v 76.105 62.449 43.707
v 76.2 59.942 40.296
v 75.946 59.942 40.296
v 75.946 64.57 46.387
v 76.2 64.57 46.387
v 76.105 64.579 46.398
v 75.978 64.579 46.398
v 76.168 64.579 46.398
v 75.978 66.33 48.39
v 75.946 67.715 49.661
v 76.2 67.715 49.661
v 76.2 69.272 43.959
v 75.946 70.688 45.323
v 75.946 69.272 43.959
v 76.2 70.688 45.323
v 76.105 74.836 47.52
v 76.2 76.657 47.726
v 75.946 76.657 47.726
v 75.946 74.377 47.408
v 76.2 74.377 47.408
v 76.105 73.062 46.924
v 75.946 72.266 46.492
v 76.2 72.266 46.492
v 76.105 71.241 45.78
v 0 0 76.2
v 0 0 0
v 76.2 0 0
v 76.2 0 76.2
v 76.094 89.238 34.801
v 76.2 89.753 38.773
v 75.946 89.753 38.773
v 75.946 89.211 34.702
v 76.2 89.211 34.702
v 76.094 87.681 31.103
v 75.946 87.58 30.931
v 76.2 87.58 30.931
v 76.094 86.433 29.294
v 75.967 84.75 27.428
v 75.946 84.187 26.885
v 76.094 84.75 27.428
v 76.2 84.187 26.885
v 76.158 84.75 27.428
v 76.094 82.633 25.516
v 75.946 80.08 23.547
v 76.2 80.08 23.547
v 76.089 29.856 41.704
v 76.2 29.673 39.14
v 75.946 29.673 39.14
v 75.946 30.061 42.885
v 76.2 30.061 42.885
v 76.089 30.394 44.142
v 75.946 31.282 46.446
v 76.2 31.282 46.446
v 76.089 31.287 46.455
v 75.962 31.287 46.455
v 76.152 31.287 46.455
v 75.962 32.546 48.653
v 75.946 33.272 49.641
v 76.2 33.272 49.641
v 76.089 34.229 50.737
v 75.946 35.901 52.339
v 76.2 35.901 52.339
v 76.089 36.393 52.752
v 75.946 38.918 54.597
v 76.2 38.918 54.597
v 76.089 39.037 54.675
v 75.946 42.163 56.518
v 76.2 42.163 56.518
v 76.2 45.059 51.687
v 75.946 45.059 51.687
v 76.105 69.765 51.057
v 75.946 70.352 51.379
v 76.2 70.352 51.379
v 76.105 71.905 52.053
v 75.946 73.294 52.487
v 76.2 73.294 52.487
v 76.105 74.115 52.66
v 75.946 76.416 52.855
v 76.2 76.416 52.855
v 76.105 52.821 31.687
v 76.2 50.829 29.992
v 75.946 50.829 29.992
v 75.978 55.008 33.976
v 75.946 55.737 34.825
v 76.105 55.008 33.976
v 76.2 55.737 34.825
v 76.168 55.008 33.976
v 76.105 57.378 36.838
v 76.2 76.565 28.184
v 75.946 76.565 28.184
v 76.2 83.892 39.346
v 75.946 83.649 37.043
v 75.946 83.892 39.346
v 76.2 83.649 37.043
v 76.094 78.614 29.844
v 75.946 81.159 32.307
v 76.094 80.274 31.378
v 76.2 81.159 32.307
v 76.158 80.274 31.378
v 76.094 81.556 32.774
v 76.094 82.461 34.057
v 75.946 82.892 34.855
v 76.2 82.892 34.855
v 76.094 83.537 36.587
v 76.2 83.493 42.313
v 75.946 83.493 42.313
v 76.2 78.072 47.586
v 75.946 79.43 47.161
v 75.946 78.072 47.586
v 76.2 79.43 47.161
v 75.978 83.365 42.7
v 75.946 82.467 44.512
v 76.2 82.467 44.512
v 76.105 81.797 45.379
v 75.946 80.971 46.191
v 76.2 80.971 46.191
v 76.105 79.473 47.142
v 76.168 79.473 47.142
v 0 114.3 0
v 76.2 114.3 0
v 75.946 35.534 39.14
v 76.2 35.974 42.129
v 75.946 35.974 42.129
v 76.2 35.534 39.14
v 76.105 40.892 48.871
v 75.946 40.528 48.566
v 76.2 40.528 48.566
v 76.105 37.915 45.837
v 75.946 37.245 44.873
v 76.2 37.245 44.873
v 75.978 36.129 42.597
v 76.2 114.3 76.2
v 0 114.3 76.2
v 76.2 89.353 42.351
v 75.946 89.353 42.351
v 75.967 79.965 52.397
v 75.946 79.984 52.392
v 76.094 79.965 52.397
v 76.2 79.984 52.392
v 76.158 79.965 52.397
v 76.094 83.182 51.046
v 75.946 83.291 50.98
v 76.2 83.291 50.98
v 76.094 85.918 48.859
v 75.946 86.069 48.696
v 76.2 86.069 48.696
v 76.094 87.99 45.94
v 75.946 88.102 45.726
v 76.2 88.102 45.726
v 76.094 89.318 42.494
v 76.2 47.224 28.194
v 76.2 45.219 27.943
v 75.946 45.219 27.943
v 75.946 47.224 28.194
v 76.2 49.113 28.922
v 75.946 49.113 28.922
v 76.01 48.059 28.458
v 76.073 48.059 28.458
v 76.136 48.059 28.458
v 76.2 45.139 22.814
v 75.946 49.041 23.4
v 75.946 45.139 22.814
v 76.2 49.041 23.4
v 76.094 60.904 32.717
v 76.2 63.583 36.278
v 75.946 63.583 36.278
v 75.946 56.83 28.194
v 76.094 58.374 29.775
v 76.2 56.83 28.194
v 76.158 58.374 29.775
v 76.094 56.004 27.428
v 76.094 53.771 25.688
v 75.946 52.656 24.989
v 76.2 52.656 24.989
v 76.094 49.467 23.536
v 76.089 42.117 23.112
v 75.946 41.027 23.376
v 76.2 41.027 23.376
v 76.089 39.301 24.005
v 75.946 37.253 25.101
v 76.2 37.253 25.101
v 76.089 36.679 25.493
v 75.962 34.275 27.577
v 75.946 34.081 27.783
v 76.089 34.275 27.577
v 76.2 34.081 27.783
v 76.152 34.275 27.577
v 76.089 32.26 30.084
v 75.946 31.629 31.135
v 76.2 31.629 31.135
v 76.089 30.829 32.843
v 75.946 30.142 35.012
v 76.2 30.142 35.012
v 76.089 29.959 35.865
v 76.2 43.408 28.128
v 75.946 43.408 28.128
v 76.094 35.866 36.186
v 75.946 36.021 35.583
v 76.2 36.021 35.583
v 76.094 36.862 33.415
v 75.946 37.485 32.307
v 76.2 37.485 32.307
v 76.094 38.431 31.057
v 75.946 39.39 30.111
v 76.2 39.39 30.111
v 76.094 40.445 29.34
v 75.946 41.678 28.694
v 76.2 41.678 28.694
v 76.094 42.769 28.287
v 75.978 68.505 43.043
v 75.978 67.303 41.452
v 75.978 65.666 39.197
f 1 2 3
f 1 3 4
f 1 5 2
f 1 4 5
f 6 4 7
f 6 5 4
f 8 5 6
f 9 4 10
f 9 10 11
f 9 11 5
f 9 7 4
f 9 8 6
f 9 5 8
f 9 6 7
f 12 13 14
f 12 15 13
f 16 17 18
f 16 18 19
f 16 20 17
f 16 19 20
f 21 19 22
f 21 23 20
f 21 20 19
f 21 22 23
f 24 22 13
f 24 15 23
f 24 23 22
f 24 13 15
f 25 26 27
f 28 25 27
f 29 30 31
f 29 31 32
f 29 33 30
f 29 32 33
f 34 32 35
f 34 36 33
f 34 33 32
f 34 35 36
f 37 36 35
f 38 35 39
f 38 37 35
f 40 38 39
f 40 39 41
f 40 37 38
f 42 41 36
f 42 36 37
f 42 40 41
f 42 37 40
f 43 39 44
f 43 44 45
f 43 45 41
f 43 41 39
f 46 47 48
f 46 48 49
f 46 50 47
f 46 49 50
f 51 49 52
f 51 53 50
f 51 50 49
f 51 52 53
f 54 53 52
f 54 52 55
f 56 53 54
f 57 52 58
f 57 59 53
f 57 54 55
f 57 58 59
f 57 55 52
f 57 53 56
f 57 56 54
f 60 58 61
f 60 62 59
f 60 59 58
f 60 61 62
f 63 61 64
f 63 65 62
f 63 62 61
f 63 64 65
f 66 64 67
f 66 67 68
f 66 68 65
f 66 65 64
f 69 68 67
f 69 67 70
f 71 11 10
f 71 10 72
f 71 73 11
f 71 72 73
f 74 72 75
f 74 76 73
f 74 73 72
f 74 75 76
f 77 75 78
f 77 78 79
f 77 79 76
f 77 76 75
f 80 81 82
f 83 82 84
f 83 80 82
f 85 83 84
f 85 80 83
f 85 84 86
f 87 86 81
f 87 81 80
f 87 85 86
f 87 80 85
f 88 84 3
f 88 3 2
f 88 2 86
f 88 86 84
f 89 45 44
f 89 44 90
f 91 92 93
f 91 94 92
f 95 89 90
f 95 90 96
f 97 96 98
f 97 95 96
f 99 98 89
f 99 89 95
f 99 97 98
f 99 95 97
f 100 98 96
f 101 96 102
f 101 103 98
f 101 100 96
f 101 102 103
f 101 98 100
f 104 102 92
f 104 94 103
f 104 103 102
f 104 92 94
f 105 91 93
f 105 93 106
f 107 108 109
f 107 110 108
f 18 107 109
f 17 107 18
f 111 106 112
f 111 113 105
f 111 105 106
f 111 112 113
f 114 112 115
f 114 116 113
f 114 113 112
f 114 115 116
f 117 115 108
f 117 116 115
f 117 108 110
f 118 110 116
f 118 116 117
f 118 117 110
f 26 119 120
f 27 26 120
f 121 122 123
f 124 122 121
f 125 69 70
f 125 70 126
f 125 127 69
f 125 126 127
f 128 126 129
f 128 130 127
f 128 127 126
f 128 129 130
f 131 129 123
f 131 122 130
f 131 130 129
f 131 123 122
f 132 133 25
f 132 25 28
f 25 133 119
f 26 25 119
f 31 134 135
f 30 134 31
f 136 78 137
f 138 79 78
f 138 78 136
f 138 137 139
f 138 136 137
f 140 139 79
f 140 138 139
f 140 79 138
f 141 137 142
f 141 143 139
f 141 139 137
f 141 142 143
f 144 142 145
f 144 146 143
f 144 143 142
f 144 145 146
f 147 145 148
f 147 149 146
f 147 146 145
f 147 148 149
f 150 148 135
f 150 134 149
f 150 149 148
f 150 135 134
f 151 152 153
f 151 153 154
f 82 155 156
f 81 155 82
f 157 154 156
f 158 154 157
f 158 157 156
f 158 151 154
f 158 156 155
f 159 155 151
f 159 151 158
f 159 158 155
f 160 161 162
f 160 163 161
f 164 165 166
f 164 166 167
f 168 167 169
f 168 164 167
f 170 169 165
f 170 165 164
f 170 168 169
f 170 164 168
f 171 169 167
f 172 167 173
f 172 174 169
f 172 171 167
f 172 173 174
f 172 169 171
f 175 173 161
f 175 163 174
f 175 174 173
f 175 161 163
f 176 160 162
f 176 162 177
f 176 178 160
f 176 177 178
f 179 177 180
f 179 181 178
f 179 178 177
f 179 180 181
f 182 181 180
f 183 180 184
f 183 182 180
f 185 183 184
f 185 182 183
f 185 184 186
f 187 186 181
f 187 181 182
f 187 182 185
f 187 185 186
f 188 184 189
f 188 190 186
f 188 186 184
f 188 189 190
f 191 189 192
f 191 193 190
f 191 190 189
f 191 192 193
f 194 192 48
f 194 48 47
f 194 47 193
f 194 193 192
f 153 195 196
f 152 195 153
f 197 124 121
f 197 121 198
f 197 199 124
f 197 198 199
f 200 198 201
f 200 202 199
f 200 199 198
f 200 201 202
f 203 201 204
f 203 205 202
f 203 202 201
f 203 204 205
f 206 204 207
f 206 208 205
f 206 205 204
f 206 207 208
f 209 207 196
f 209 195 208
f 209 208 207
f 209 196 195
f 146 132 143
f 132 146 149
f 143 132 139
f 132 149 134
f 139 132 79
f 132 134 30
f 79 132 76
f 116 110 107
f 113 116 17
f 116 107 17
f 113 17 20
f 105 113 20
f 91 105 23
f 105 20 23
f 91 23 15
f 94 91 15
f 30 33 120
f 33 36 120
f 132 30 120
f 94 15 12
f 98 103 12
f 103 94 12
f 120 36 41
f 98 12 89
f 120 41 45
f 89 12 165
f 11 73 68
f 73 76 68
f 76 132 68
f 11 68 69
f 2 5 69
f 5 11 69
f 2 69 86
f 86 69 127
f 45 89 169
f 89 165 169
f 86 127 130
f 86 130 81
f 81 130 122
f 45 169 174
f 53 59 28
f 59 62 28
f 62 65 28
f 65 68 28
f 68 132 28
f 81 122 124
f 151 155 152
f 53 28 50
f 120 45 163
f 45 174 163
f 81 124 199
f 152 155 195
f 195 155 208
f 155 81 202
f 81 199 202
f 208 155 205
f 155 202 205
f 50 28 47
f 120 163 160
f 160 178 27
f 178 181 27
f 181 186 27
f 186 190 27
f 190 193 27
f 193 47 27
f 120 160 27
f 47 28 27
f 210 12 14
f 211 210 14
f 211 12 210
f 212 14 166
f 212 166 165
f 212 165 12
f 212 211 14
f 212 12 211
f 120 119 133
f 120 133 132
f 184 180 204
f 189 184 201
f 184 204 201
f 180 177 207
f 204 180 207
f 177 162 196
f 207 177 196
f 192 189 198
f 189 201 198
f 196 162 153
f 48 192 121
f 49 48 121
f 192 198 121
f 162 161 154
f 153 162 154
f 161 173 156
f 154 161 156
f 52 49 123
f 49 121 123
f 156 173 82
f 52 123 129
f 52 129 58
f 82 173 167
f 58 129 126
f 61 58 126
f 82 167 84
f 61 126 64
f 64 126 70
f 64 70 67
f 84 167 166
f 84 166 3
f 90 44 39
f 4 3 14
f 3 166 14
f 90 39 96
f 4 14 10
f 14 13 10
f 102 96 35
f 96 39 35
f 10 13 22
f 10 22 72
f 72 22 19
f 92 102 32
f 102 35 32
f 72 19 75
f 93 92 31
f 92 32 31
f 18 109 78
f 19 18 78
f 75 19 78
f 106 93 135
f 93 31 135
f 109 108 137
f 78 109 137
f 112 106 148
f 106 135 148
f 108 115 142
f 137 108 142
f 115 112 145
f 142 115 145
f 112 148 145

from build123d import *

# Parameters (mm, degrees)
SKETCH1_W           = 76.2
SKETCH1_H           = 76.2
BOSS_EXTRUDE1_DEPTH = 114.3
CUT_EXTRUDE1_DEPTH  = 0.254


with BuildPart() as part:
    # Sketch1 → Boss-Extrude1 (new body)
    with BuildSketch(Plane(origin=(0, 0, 0), x_dir=(1, 0, 0), z_dir=(0, 1, 0))):
        with Locations((38.1, -38.1)):
            Rectangle(SKETCH1_W, SKETCH1_H)
    extrude(amount=BOSS_EXTRUDE1_DEPTH)

    # Sketch2 → Cut-Extrude1 (cut)
    with BuildSketch(Plane(origin=(76.2, 0, 0), x_dir=(0, 0, -1), z_dir=(1, 0, 0))):
        with BuildLine():
            Line((-56.518128947, 42.162735797), (-51.686939044, 45.059160076))
            add(Edge.make_bspline(
                [(-51.686939044, 45.059160076), (-51.237605541, 44.306994476), (-50.37669989, 42.865874213), (-48.94057984, 40.918560781), (-47.452509591, 39.263461564), (-45.901469473, 37.910204958), (-44.29692692, 36.84478385), (-42.6284073, 36.09036741), (-40.901533333, 35.619843698), (-39.726303648, 35.562692284), (-39.139583274, 35.534160076)],
                knots=[0, 0, 0, 0, 1.272034388, 2.437168799, 3.508375237, 4.49857839, 5.41946034, 6.295179144, 7.148887113, 8, 8, 8, 8], degree=3))
            add(Edge.make_bspline(
                [(-39.139583274, 35.534160076), (-38.638510681, 35.548115657), (-37.645133086, 35.575782629), (-36.182709605, 35.841624868), (-34.762421034, 36.250037202), (-33.413539992, 36.834941841), (-32.154678743, 37.5425974), (-31.050757989, 38.397335699), (-30.096416456, 39.354291315), (-29.315761913, 40.421896662), (-28.716829337, 41.570075245), (-28.256493134, 42.748605422), (-28.001031432, 43.976000758), (-27.962549015, 44.802397316), (-27.943128947, 45.219436518)],
                knots=[0, 0, 0, 0, 1.095163259, 2.171163733, 3.241058638, 4.321873601, 5.38011039, 6.391990106, 7.366004449, 8.327778327, 9.272591725, 10.192022065, 11.087607919, 12, 12, 12, 12], degree=3))
            add(Edge.make_bspline(
                [(-27.943128947, 45.219436518), (-27.967202335, 45.695264964), (-28.016140014, 46.662554662), (-28.429766896, 48.089666138), (-29.080448169, 49.501966246), (-29.680729623, 50.375565483), (-29.992377746, 50.829111999)],
                knots=[0, 0, 0, 0, 0.938893495, 1.908633276, 2.914225137, 4, 4, 4, 4], degree=3))
            add(Edge.make_bspline(
                [(-29.992377746, 50.829111999), (-30.248256489, 51.15644799), (-30.785441902, 51.843648958), (-31.708945287, 52.86655616), (-32.792609125, 53.921682629), (-33.9993486, 55.049318374), (-35.37312175, 56.197017682), (-36.870901021, 57.419509706), (-38.530926604, 58.670304029), (-39.695145527, 59.509144635), (-40.295863322, 59.941972576)],
                knots=[0, 0, 0, 0, 0.722233717, 1.516239348, 2.393582979, 3.351407094, 4.387010283, 5.505090956, 6.712668013, 8, 8, 8, 8], degree=3))
            add(Edge.make_bspline(
                [(-40.295863322, 59.941972576), (-40.897146574, 60.370247942), (-42.046754365, 61.18907783), (-43.654442359, 62.404320067), (-45.092082663, 63.515379251), (-46.353285461, 64.532714763), (-47.437496021, 65.456464581), (-48.353258004, 66.277758073), (-49.0772433, 67.018806788), (-49.47983371, 67.499541839), (-49.66058688, 67.715380027)],
                knots=[0, 0, 0, 0, 1.452282411, 2.77665338, 3.964542531, 5.026858415, 5.96415736, 6.766646006, 7.446254459, 8, 8, 8, 8], degree=3))
            add(Edge.make_bspline(
                [(-49.66058688, 67.715380027), (-49.91323144, 68.051765529), (-50.410090874, 68.713312764), (-51.065944363, 69.747317227), (-51.623388121, 70.805788546), (-52.060378773, 71.891571021), (-52.428363032, 72.989421359), (-52.675870387, 74.113663843), (-52.830851339, 75.259253856), (-52.846722491, 76.030182873), (-52.854667409, 76.416101181)],
                knots=[0, 0, 0, 0, 1.068054152, 2.10047183, 3.106115577, 4.101338837, 5.06977816, 6.043150881, 7.020423561, 8, 8, 8, 8], degree=3))
            add(Edge.make_bspline(
                [(-52.854667409, 76.416101181), (-52.833355211, 77.0207445), (-52.791186347, 78.217107312), (-52.434561901, 79.964767872), (-51.871668795, 81.633326085), (-51.083082269, 83.20626282), (-50.066508635, 84.642621622), (-48.890100796, 85.958924702), (-47.488921814, 87.065488838), (-45.951543979, 88.032337163), (-44.268780647, 88.789099913), (-42.505443467, 89.359962775), (-40.658729848, 89.683419654), (-39.407910093, 89.729837944), (-38.773237121, 89.753390845)],
                knots=[0, 0, 0, 0, 1.005424448, 1.989358655, 2.955360095, 3.929531133, 4.905563448, 5.876582895, 6.856512386, 7.866279853, 8.892233794, 9.918561126, 10.94386622, 12, 12, 12, 12], degree=3))
            add(Edge.make_bspline(
                [(-38.773237121, 89.753390845), (-38.099779883, 89.730162609), (-36.760488382, 89.683969063), (-34.790459048, 89.282326516), (-32.893720493, 88.617742689), (-31.367925469, 87.863547888), (-30.17377195, 87.110287772), (-29.2630829, 86.42416407), (-28.340233668, 85.634267653), (-27.397780287, 84.738494535), (-26.451692091, 83.728625442), (-25.487923435, 82.611576622), (-24.504220588, 81.394174574), (-23.871392758, 80.525094512), (-23.546975101, 80.07956272)],
                knots=[0, 0, 0, 0, 1.286793592, 2.559021753, 3.825965368, 5.121522368, 5.803751409, 6.523245864, 7.299691795, 8.125521123, 9.008227632, 9.944561021, 10.946284179, 12, 12, 12, 12], degree=3))
            Line((-23.546975101, 80.07956272), (-28.183543611, 76.564929306))
            add(Edge.make_bspline(
                [(-28.183543611, 76.564929306), (-28.463512194, 76.925606066), (-29.002666226, 77.620185175), (-29.821209133, 78.592899657), (-30.592712055, 79.48144303), (-31.352813583, 80.253215049), (-32.061369594, 80.950479883), (-32.749080727, 81.547448484), (-33.406050205, 82.049969992), (-34.234184903, 82.586258407), (-35.274604218, 83.117859601), (-36.580637431, 83.56769669), (-37.945481893, 83.838017201), (-38.875061448, 83.873758608), (-39.345652986, 83.891852383)],
                knots=[0, 0, 0, 0, 1.181633172, 2.275549214, 3.290209073, 4.226197932, 5.078386478, 5.862611352, 6.581680152, 7.217281963, 8.414376989, 9.595101626, 10.782541182, 12, 12, 12, 12], degree=3))
            add(Edge.make_bspline(
                [(-39.345652986, 83.891852383), (-39.936037345, 83.872067054), (-41.074537965, 83.83391291), (-42.690907106, 83.417208008), (-44.145683625, 82.761095632), (-45.395677651, 81.841552489), (-46.436411434, 80.752093994), (-47.18924771, 79.498404975), (-47.642368254, 78.114029458), (-47.697661364, 77.148330699), (-47.725821255, 76.656515845)],
                knots=[0, 0, 0, 0, 1.14458467, 2.207223713, 3.21896685, 4.227309161, 5.202851033, 6.127160689, 7.046193047, 8, 8, 8, 8], degree=3))
            add(Edge.make_bspline(
                [(-47.725821255, 76.656515845), (-47.719402059, 76.350330988), (-47.70655317, 75.737460602), (-47.527350402, 74.832018098), (-47.297128502, 73.928862941), (-46.932305243, 73.032055625), (-46.4286455, 72.125912019), (-45.767253842, 71.194828504), (-44.934279332, 70.230598461), (-44.296207545, 69.603460915), (-43.959324861, 69.272351181)],
                knots=[0, 0, 0, 0, 0.858281714, 1.717966888, 2.583508476, 3.4729293, 4.427298488, 5.488583878, 6.674047936, 8, 8, 8, 8], degree=3))
            add(Edge.make_bspline(
                [(-43.959324861, 69.272351181), (-43.834225594, 69.160712317), (-43.537018372, 68.895483929), (-42.993670042, 68.461269976), (-42.276146922, 67.925647565), (-41.403185552, 67.262914669), (-40.358689917, 66.494141652), (-39.142545164, 65.629158242), (-37.768307564, 64.639884247), (-36.793133994, 63.948246119), (-36.277503947, 63.582537479)],
                knots=[0, 0, 0, 0, 0.420754252, 0.999615792, 1.744751191, 2.668019286, 3.750313428, 4.999500688, 6.413464383, 8, 8, 8, 8], degree=3))
            add(Edge.make_bspline(
                [(-36.277503947, 63.582537479), (-35.657248249, 63.131193566), (-34.456209054, 62.257228632), (-32.747300285, 60.944155456), (-31.197819961, 59.659949749), (-29.802327937, 58.412812536), (-28.547037846, 57.212203818), (-27.445876207, 56.043679316), (-26.487622884, 54.915610608), (-25.455996503, 53.469346979), (-24.401859535, 51.693107274), (-23.496578921, 49.516864036), (-22.925759048, 47.33216126), (-22.851112732, 45.863784488), (-22.814282794, 45.139298297)],
                knots=[0, 0, 0, 0, 1.163667725, 2.253281268, 3.268753668, 4.215851969, 5.092017293, 5.902905408, 6.650798638, 7.335211899, 8.59617414, 9.77448103, 10.901945474, 12, 12, 12, 12], degree=3))
            add(Edge.make_bspline(
                [(-22.814282794, 45.139298297), (-22.82501292, 44.626934421), (-22.846264802, 43.61215643), (-23.090555151, 42.122091389), (-23.44847197, 40.674875902), (-23.987922804, 39.288398738), (-24.646342374, 37.93729497), (-25.481814107, 36.657005967), (-26.450223874, 35.419195773), (-27.561118063, 34.25687105), (-28.776713297, 33.189861021), (-30.061505625, 32.240696489), (-31.417597939, 31.449278008), (-32.837633653, 30.803469259), (-34.321938951, 30.298369108), (-35.870014621, 29.932398974), (-37.484412497, 29.707787866), (-38.581700361, 29.684474561), (-39.139583274, 29.672621614)],
                knots=[0, 0, 0, 0, 0.983748083, 1.948392443, 2.894712957, 3.844097841, 4.80183111, 5.778335162, 6.776009319, 7.81870978, 8.863265674, 9.881300176, 10.883814829, 11.87499822, 12.874611388, 13.892143829, 14.928324115, 16, 16, 16, 16], degree=3))
            add(Edge.make_bspline(
                [(-39.139583274, 29.672621614), (-39.571234661, 29.680968479), (-40.429101228, 29.69755709), (-41.697986054, 29.844208568), (-42.941236774, 30.051697417), (-44.143252837, 30.38111116), (-45.319520858, 30.780785228), (-46.464924988, 31.272901144), (-47.580020339, 31.862643448), (-48.671056013, 32.536932207), (-49.735257178, 33.321646522), (-50.762642205, 34.235613757), (-51.786920191, 35.253626788), (-52.777858677, 36.403330701), (-53.75550159, 37.666151111), (-54.700573334, 39.053903063), (-55.632636239, 40.559027568), (-56.217451663, 41.618181754), (-56.518128947, 42.162735797)],
                knots=[0, 0, 0, 0, 0.915332311, 1.819136955, 2.706846663, 3.586547465, 4.459518054, 5.340707479, 6.227863349, 7.133153174, 8.059268498, 9.028702269, 10.047606654, 11.120612155, 12.245963614, 13.433783089, 14.680604001, 16, 16, 16, 16], degree=3))
        make_face()
    extrude(amount=-CUT_EXTRUDE1_DEPTH, mode=Mode.SUBTRACT)


solid = part.part
